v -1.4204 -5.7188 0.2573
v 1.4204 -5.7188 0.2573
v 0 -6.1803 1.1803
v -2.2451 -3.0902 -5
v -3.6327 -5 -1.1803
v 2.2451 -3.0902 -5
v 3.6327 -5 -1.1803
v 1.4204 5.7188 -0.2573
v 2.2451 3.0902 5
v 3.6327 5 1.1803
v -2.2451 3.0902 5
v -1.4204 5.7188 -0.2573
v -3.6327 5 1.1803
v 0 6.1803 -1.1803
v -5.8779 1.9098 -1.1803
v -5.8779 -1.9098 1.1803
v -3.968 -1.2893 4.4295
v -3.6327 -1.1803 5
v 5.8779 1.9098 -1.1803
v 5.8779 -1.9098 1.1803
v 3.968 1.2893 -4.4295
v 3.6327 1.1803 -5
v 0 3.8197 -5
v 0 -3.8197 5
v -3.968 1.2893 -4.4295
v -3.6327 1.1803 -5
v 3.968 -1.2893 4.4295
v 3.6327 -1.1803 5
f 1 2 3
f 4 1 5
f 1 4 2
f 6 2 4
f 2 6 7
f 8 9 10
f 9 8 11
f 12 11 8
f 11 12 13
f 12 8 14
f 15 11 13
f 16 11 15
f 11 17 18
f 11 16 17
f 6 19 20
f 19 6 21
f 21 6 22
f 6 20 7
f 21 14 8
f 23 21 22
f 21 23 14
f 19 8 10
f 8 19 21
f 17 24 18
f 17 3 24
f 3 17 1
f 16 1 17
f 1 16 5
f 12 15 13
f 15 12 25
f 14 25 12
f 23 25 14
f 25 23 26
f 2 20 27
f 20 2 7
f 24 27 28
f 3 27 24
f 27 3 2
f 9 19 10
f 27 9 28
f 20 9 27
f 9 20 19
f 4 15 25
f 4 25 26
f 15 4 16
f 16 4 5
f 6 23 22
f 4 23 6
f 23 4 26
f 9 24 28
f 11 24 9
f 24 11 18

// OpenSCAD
// 12面体骰子
module item(w=10,d=45,p=0){
    rotate([d,0,p])
        cube([w*2,w,w*2],center=true);
}

module dice_12(w=10){
    d=90-acos(tan(18)/tan(36));
    intersection(){
        item(w,90,0);
        intersection_for (a = [ 0 : 4 ])item(w,d,72*a);
    };
}

w=10;
dice_12(w);
